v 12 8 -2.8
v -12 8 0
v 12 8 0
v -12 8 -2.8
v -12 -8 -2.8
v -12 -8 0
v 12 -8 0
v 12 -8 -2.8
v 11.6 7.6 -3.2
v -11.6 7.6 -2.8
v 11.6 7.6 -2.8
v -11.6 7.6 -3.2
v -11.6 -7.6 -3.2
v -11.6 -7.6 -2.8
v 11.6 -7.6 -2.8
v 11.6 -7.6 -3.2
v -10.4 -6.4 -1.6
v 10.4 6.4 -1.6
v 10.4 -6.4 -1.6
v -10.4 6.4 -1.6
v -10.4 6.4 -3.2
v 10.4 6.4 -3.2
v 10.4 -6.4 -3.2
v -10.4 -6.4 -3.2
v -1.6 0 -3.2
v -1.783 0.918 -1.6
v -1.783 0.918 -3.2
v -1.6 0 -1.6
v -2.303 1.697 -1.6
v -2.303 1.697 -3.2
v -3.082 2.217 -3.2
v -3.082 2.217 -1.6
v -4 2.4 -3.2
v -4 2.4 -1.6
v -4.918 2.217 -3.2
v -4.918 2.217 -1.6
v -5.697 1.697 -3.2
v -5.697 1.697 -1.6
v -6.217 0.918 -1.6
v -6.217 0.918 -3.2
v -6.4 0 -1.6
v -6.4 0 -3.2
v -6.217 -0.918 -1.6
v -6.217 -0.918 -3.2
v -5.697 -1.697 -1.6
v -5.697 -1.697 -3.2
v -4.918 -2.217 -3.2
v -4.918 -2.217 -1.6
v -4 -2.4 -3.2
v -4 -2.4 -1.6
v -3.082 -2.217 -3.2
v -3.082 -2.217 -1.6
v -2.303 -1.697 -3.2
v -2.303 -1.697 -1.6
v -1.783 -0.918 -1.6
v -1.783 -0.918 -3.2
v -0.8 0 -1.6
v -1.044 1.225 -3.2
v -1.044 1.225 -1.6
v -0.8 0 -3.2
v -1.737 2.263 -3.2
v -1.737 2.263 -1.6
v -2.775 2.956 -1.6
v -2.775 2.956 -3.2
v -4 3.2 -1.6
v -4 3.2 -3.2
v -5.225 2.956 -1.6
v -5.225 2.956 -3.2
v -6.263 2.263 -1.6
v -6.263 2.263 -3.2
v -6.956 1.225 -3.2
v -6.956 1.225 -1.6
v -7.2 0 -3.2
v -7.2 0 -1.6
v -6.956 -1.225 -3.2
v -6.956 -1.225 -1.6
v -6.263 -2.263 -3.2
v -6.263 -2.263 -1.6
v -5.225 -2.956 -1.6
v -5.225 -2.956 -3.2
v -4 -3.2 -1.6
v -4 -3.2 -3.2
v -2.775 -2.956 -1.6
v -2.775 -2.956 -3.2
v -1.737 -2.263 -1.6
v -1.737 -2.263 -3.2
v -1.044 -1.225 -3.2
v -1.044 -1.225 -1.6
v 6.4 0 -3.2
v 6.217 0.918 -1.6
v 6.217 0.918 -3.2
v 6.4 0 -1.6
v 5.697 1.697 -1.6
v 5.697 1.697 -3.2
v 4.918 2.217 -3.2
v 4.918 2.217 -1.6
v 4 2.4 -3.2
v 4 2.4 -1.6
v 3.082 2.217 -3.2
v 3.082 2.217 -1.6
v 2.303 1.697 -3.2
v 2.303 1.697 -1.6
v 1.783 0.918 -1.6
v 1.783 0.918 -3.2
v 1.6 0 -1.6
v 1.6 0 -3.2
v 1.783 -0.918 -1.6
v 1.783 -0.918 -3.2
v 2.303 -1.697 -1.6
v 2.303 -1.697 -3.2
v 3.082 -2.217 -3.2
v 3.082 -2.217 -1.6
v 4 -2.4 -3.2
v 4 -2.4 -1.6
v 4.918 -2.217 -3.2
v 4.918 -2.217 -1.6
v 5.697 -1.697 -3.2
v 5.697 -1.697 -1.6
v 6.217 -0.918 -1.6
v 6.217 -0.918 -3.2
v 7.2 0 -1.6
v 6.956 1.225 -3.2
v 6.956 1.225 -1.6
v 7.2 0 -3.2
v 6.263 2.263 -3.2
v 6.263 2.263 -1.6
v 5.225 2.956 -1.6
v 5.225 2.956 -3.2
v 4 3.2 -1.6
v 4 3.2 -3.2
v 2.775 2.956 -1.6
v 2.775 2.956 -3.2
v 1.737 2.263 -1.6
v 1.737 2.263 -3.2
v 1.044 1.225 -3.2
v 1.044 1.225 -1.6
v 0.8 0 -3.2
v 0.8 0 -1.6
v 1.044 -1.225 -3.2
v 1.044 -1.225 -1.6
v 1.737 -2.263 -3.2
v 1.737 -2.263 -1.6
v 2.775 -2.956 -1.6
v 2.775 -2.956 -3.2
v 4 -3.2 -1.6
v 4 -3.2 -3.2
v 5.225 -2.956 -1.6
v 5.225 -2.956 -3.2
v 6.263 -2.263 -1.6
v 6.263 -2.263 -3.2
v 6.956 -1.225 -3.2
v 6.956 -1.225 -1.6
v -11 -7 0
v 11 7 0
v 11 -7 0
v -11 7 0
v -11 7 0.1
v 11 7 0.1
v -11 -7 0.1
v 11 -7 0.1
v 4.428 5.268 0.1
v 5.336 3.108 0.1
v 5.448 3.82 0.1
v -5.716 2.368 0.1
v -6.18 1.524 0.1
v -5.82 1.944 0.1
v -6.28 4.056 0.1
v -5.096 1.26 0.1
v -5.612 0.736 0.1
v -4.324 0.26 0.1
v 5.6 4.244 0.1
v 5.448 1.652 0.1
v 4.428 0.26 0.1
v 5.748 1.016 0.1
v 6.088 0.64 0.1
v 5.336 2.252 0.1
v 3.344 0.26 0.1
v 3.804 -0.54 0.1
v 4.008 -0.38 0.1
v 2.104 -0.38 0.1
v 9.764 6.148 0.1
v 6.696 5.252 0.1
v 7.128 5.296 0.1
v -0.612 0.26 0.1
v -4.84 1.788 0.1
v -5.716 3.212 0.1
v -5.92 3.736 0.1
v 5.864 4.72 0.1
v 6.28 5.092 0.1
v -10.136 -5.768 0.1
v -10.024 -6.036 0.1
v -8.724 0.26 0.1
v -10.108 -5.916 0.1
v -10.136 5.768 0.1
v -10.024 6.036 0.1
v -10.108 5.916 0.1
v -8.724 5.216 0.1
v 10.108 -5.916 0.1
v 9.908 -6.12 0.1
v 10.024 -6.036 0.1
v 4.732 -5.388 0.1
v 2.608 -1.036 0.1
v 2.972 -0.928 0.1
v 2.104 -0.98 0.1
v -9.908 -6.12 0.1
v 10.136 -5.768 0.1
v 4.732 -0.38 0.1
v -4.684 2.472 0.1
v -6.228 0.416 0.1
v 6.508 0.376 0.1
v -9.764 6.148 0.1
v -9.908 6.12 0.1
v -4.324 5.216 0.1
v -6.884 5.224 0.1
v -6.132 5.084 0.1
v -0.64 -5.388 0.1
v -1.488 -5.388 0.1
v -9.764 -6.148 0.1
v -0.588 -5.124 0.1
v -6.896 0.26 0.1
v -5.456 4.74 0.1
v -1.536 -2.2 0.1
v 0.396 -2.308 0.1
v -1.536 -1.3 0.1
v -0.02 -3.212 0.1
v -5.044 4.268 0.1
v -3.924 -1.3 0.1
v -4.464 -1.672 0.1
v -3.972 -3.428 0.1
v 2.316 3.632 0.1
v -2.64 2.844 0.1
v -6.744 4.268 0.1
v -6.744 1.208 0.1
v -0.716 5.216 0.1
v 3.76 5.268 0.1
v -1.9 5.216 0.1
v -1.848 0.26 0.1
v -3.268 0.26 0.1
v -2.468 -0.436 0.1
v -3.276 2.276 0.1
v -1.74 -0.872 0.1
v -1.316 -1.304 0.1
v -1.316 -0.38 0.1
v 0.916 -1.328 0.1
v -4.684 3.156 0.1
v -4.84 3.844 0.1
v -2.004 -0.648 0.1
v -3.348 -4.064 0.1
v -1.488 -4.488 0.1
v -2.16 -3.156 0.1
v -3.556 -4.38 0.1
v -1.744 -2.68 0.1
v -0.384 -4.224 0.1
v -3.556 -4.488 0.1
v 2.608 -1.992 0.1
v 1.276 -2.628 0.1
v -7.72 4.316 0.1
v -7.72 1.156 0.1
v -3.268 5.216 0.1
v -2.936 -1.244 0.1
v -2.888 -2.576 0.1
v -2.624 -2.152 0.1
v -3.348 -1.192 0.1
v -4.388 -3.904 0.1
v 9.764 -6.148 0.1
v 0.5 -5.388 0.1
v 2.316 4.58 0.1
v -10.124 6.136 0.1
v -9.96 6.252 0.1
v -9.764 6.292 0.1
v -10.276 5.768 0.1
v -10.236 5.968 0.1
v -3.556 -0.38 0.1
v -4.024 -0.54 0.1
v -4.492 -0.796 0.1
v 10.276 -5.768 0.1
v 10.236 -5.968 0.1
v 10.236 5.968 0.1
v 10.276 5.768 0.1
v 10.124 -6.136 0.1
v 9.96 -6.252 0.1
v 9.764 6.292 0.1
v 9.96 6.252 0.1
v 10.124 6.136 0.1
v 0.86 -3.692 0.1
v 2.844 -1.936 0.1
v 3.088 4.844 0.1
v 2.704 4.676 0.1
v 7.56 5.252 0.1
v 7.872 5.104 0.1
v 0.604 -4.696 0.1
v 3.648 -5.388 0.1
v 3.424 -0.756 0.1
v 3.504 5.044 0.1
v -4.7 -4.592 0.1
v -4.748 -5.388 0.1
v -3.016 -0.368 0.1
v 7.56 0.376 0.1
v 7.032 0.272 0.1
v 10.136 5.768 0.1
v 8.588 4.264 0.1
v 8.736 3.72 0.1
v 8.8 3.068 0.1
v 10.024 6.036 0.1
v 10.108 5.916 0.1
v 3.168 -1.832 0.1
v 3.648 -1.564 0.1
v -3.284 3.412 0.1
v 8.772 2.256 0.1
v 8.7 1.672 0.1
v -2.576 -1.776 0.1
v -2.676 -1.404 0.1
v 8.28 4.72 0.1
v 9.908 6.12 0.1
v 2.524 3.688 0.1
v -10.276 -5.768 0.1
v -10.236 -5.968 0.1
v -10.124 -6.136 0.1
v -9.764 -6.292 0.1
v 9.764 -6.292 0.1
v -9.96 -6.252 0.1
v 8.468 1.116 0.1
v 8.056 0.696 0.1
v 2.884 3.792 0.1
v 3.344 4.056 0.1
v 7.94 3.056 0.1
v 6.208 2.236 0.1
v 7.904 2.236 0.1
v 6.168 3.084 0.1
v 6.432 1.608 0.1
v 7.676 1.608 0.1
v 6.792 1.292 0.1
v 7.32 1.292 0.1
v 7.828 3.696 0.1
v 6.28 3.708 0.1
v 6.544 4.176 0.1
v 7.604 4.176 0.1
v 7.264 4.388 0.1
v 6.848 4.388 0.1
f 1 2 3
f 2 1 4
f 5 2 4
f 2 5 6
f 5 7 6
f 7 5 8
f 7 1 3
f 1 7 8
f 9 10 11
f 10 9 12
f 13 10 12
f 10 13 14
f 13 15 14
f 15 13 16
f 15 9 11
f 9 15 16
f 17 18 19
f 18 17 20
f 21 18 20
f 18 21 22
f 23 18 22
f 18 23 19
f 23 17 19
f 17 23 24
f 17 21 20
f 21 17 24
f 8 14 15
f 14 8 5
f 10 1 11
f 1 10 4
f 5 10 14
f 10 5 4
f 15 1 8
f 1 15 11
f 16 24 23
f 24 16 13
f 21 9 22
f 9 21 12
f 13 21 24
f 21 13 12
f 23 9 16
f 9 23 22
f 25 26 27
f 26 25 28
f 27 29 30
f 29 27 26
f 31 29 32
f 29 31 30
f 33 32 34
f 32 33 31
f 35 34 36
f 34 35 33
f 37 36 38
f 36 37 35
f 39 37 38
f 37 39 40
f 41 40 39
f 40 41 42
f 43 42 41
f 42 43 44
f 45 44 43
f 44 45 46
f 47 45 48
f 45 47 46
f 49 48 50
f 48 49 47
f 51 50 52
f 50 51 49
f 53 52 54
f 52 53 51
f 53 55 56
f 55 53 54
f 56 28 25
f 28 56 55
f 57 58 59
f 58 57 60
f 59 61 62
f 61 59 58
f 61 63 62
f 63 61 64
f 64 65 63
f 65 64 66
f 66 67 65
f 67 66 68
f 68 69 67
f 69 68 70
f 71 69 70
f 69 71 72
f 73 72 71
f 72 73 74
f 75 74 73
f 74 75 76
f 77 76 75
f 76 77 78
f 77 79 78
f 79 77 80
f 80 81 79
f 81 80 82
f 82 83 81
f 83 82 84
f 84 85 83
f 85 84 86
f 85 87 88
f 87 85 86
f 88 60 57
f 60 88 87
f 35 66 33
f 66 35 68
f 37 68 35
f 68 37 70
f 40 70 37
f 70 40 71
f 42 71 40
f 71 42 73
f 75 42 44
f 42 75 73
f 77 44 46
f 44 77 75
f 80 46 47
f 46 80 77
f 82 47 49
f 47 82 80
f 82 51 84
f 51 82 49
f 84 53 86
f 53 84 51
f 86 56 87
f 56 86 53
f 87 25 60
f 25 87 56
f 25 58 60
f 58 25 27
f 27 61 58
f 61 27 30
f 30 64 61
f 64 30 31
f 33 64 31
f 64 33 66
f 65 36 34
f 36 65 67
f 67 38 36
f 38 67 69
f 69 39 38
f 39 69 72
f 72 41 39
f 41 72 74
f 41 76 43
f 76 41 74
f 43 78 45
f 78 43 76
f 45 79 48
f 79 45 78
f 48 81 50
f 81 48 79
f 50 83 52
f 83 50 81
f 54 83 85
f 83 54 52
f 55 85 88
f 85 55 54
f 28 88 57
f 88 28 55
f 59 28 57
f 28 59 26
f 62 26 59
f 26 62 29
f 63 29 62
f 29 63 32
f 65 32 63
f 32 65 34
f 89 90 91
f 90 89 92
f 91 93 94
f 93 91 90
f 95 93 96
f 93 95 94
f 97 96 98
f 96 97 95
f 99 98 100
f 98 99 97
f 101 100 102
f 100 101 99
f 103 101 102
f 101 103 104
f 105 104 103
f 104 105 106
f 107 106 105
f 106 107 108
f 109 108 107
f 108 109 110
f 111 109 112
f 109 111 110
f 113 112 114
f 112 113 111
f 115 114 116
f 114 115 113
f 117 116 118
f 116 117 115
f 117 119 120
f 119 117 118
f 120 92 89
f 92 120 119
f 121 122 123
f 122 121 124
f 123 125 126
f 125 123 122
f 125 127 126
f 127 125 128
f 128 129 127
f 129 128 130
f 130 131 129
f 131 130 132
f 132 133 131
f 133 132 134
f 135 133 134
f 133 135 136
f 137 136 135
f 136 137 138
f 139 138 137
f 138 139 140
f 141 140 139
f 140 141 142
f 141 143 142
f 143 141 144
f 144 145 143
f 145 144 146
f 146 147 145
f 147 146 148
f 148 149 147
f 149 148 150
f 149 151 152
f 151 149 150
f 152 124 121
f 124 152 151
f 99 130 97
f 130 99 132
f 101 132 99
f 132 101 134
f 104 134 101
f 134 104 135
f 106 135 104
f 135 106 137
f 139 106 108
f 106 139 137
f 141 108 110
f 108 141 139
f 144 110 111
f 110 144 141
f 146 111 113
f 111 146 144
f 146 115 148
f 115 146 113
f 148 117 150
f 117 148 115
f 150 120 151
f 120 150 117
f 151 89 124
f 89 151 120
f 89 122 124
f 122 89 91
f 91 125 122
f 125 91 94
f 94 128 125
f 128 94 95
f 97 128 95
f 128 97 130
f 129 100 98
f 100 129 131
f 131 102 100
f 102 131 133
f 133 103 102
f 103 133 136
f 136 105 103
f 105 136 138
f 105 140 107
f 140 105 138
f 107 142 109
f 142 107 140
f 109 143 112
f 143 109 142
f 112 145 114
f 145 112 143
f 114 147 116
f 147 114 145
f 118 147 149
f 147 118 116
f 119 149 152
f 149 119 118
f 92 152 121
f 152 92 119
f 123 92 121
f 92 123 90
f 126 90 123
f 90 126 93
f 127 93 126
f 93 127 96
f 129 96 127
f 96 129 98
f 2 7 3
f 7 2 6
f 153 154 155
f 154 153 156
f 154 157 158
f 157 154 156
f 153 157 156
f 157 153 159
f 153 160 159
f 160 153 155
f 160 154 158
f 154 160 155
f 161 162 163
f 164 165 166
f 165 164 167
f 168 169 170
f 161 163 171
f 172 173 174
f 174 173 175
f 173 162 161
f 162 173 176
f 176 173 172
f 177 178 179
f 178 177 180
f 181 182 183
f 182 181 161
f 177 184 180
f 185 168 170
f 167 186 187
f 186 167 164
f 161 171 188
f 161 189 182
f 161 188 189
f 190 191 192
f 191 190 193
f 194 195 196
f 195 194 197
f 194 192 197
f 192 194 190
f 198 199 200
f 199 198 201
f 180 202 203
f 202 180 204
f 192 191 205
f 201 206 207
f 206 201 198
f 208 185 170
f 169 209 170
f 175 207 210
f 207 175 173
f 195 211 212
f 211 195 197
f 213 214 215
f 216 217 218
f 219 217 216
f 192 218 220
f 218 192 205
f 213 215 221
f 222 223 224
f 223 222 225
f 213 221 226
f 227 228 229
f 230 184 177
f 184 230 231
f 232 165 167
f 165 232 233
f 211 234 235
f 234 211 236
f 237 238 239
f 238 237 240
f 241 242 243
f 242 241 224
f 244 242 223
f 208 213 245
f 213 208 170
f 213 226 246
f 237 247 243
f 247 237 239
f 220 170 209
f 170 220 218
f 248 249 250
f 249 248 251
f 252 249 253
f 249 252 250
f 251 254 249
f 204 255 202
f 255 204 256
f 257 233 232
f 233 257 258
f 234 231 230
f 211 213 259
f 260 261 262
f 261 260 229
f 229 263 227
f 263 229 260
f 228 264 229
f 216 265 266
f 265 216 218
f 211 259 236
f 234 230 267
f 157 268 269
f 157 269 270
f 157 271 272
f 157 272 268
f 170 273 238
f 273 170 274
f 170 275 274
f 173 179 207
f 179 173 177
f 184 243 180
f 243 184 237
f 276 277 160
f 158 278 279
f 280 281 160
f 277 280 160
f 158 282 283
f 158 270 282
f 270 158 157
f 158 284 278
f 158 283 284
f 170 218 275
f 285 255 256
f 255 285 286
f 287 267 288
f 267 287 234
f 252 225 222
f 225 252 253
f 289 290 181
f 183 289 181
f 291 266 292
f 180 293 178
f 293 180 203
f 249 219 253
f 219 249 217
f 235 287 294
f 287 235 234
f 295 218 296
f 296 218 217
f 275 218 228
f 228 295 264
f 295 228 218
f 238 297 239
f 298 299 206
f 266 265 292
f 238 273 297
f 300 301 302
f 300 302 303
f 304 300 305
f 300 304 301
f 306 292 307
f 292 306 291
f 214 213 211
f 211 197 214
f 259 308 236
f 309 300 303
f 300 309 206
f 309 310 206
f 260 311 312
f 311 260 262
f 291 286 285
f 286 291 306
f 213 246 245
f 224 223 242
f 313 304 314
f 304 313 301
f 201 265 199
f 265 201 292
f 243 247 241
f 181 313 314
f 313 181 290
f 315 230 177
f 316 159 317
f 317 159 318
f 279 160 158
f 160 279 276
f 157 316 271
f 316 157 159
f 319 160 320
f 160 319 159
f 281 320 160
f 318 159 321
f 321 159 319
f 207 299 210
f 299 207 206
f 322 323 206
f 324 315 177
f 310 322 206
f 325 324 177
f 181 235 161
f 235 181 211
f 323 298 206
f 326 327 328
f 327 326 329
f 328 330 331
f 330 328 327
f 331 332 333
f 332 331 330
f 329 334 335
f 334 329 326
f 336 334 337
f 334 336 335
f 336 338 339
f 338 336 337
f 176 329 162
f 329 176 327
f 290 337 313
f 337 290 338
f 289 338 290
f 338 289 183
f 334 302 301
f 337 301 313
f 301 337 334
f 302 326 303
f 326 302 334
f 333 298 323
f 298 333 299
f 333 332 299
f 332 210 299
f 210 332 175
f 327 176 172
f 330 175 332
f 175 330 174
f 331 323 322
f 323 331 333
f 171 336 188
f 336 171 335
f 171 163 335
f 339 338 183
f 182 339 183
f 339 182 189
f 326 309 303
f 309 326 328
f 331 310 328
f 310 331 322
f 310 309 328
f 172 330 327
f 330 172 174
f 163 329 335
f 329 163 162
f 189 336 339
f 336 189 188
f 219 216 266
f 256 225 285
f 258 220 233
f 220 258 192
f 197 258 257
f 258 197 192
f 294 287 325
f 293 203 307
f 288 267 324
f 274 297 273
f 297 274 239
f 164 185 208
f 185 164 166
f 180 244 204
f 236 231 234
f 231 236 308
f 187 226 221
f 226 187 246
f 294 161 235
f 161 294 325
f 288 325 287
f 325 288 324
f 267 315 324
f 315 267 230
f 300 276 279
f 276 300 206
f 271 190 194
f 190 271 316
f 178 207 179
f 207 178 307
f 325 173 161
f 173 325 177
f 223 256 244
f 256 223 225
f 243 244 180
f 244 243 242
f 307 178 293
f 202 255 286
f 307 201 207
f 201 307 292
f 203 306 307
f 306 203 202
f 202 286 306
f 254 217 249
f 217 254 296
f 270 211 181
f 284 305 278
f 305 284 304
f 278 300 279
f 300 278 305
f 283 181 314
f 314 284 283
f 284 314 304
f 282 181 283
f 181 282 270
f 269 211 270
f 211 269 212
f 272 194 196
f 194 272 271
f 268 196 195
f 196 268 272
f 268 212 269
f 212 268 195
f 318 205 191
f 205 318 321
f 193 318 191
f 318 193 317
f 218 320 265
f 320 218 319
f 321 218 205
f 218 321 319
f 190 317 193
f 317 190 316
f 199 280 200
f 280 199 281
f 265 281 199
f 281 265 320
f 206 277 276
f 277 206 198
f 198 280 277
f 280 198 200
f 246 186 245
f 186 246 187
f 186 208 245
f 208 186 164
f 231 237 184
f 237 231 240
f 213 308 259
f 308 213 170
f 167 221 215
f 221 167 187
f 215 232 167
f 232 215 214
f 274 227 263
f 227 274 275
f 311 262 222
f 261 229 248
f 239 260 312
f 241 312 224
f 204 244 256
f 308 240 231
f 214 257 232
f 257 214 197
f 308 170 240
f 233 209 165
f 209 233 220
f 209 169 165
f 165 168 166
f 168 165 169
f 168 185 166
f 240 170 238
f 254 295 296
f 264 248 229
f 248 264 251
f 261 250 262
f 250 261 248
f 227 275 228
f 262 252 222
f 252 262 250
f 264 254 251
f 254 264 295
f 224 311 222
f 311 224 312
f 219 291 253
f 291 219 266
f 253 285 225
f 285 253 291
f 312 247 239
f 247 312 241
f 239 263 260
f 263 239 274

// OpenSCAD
use <../lib.scad>
use <26603.scad>
use <6296256o.scad>
function ldraw_lib__26603d0o() = [
// 0 Tile  2 x  3 with White "DK 10 271" on Black Background Sticker
// 0 Name: 26603d0o.dat
// 0 Author: Evert-Jan Boer [ejboer]
// 0 !LDRAW_ORG Shortcut UPDATE 2026-07
// 0 !LICENSE Licensed under CC BY 4.0 : see CAreadme.txt
// 
// 0 BFC CERTIFY CCW
  [0,"BFC","CERTIFY"],
  [0,"BFC","CCW"],
// 
// 0 !CATEGORY Sticker Shortcut
// 0 !KEYWORDS Bricklink 26603pb147, Fiat 500, set 10271
// 
// 0 !HISTORY 2026-07-30 [OrionP] Official Update 2026-07
// 
// 1 16 0 0 0 1 0 0 0 1 0 0 0 1 26603.dat
  [1,16,0,0,0,1,0,0,0,1,0,0,0,1, ldraw_lib__26603()],
// 1 16 0 0 0 1 0 0 0 1 0 0 0 1 6296256o.dat
  [1,16,0,0,0,1,0,0,0,1,0,0,0,1, ldraw_lib__6296256o()],
];
module ldraw_lib__26603d0o(step=0, col=false, unit=2/5, alt=false, line=0.2, solid=!$preview)
    makepoly(ldraw_lib__26603d0o(), step=step, col=col, unit=unit, alt=alt, line=line, solid=solid);
ldraw_lib__26603d0o(line=0.2);
